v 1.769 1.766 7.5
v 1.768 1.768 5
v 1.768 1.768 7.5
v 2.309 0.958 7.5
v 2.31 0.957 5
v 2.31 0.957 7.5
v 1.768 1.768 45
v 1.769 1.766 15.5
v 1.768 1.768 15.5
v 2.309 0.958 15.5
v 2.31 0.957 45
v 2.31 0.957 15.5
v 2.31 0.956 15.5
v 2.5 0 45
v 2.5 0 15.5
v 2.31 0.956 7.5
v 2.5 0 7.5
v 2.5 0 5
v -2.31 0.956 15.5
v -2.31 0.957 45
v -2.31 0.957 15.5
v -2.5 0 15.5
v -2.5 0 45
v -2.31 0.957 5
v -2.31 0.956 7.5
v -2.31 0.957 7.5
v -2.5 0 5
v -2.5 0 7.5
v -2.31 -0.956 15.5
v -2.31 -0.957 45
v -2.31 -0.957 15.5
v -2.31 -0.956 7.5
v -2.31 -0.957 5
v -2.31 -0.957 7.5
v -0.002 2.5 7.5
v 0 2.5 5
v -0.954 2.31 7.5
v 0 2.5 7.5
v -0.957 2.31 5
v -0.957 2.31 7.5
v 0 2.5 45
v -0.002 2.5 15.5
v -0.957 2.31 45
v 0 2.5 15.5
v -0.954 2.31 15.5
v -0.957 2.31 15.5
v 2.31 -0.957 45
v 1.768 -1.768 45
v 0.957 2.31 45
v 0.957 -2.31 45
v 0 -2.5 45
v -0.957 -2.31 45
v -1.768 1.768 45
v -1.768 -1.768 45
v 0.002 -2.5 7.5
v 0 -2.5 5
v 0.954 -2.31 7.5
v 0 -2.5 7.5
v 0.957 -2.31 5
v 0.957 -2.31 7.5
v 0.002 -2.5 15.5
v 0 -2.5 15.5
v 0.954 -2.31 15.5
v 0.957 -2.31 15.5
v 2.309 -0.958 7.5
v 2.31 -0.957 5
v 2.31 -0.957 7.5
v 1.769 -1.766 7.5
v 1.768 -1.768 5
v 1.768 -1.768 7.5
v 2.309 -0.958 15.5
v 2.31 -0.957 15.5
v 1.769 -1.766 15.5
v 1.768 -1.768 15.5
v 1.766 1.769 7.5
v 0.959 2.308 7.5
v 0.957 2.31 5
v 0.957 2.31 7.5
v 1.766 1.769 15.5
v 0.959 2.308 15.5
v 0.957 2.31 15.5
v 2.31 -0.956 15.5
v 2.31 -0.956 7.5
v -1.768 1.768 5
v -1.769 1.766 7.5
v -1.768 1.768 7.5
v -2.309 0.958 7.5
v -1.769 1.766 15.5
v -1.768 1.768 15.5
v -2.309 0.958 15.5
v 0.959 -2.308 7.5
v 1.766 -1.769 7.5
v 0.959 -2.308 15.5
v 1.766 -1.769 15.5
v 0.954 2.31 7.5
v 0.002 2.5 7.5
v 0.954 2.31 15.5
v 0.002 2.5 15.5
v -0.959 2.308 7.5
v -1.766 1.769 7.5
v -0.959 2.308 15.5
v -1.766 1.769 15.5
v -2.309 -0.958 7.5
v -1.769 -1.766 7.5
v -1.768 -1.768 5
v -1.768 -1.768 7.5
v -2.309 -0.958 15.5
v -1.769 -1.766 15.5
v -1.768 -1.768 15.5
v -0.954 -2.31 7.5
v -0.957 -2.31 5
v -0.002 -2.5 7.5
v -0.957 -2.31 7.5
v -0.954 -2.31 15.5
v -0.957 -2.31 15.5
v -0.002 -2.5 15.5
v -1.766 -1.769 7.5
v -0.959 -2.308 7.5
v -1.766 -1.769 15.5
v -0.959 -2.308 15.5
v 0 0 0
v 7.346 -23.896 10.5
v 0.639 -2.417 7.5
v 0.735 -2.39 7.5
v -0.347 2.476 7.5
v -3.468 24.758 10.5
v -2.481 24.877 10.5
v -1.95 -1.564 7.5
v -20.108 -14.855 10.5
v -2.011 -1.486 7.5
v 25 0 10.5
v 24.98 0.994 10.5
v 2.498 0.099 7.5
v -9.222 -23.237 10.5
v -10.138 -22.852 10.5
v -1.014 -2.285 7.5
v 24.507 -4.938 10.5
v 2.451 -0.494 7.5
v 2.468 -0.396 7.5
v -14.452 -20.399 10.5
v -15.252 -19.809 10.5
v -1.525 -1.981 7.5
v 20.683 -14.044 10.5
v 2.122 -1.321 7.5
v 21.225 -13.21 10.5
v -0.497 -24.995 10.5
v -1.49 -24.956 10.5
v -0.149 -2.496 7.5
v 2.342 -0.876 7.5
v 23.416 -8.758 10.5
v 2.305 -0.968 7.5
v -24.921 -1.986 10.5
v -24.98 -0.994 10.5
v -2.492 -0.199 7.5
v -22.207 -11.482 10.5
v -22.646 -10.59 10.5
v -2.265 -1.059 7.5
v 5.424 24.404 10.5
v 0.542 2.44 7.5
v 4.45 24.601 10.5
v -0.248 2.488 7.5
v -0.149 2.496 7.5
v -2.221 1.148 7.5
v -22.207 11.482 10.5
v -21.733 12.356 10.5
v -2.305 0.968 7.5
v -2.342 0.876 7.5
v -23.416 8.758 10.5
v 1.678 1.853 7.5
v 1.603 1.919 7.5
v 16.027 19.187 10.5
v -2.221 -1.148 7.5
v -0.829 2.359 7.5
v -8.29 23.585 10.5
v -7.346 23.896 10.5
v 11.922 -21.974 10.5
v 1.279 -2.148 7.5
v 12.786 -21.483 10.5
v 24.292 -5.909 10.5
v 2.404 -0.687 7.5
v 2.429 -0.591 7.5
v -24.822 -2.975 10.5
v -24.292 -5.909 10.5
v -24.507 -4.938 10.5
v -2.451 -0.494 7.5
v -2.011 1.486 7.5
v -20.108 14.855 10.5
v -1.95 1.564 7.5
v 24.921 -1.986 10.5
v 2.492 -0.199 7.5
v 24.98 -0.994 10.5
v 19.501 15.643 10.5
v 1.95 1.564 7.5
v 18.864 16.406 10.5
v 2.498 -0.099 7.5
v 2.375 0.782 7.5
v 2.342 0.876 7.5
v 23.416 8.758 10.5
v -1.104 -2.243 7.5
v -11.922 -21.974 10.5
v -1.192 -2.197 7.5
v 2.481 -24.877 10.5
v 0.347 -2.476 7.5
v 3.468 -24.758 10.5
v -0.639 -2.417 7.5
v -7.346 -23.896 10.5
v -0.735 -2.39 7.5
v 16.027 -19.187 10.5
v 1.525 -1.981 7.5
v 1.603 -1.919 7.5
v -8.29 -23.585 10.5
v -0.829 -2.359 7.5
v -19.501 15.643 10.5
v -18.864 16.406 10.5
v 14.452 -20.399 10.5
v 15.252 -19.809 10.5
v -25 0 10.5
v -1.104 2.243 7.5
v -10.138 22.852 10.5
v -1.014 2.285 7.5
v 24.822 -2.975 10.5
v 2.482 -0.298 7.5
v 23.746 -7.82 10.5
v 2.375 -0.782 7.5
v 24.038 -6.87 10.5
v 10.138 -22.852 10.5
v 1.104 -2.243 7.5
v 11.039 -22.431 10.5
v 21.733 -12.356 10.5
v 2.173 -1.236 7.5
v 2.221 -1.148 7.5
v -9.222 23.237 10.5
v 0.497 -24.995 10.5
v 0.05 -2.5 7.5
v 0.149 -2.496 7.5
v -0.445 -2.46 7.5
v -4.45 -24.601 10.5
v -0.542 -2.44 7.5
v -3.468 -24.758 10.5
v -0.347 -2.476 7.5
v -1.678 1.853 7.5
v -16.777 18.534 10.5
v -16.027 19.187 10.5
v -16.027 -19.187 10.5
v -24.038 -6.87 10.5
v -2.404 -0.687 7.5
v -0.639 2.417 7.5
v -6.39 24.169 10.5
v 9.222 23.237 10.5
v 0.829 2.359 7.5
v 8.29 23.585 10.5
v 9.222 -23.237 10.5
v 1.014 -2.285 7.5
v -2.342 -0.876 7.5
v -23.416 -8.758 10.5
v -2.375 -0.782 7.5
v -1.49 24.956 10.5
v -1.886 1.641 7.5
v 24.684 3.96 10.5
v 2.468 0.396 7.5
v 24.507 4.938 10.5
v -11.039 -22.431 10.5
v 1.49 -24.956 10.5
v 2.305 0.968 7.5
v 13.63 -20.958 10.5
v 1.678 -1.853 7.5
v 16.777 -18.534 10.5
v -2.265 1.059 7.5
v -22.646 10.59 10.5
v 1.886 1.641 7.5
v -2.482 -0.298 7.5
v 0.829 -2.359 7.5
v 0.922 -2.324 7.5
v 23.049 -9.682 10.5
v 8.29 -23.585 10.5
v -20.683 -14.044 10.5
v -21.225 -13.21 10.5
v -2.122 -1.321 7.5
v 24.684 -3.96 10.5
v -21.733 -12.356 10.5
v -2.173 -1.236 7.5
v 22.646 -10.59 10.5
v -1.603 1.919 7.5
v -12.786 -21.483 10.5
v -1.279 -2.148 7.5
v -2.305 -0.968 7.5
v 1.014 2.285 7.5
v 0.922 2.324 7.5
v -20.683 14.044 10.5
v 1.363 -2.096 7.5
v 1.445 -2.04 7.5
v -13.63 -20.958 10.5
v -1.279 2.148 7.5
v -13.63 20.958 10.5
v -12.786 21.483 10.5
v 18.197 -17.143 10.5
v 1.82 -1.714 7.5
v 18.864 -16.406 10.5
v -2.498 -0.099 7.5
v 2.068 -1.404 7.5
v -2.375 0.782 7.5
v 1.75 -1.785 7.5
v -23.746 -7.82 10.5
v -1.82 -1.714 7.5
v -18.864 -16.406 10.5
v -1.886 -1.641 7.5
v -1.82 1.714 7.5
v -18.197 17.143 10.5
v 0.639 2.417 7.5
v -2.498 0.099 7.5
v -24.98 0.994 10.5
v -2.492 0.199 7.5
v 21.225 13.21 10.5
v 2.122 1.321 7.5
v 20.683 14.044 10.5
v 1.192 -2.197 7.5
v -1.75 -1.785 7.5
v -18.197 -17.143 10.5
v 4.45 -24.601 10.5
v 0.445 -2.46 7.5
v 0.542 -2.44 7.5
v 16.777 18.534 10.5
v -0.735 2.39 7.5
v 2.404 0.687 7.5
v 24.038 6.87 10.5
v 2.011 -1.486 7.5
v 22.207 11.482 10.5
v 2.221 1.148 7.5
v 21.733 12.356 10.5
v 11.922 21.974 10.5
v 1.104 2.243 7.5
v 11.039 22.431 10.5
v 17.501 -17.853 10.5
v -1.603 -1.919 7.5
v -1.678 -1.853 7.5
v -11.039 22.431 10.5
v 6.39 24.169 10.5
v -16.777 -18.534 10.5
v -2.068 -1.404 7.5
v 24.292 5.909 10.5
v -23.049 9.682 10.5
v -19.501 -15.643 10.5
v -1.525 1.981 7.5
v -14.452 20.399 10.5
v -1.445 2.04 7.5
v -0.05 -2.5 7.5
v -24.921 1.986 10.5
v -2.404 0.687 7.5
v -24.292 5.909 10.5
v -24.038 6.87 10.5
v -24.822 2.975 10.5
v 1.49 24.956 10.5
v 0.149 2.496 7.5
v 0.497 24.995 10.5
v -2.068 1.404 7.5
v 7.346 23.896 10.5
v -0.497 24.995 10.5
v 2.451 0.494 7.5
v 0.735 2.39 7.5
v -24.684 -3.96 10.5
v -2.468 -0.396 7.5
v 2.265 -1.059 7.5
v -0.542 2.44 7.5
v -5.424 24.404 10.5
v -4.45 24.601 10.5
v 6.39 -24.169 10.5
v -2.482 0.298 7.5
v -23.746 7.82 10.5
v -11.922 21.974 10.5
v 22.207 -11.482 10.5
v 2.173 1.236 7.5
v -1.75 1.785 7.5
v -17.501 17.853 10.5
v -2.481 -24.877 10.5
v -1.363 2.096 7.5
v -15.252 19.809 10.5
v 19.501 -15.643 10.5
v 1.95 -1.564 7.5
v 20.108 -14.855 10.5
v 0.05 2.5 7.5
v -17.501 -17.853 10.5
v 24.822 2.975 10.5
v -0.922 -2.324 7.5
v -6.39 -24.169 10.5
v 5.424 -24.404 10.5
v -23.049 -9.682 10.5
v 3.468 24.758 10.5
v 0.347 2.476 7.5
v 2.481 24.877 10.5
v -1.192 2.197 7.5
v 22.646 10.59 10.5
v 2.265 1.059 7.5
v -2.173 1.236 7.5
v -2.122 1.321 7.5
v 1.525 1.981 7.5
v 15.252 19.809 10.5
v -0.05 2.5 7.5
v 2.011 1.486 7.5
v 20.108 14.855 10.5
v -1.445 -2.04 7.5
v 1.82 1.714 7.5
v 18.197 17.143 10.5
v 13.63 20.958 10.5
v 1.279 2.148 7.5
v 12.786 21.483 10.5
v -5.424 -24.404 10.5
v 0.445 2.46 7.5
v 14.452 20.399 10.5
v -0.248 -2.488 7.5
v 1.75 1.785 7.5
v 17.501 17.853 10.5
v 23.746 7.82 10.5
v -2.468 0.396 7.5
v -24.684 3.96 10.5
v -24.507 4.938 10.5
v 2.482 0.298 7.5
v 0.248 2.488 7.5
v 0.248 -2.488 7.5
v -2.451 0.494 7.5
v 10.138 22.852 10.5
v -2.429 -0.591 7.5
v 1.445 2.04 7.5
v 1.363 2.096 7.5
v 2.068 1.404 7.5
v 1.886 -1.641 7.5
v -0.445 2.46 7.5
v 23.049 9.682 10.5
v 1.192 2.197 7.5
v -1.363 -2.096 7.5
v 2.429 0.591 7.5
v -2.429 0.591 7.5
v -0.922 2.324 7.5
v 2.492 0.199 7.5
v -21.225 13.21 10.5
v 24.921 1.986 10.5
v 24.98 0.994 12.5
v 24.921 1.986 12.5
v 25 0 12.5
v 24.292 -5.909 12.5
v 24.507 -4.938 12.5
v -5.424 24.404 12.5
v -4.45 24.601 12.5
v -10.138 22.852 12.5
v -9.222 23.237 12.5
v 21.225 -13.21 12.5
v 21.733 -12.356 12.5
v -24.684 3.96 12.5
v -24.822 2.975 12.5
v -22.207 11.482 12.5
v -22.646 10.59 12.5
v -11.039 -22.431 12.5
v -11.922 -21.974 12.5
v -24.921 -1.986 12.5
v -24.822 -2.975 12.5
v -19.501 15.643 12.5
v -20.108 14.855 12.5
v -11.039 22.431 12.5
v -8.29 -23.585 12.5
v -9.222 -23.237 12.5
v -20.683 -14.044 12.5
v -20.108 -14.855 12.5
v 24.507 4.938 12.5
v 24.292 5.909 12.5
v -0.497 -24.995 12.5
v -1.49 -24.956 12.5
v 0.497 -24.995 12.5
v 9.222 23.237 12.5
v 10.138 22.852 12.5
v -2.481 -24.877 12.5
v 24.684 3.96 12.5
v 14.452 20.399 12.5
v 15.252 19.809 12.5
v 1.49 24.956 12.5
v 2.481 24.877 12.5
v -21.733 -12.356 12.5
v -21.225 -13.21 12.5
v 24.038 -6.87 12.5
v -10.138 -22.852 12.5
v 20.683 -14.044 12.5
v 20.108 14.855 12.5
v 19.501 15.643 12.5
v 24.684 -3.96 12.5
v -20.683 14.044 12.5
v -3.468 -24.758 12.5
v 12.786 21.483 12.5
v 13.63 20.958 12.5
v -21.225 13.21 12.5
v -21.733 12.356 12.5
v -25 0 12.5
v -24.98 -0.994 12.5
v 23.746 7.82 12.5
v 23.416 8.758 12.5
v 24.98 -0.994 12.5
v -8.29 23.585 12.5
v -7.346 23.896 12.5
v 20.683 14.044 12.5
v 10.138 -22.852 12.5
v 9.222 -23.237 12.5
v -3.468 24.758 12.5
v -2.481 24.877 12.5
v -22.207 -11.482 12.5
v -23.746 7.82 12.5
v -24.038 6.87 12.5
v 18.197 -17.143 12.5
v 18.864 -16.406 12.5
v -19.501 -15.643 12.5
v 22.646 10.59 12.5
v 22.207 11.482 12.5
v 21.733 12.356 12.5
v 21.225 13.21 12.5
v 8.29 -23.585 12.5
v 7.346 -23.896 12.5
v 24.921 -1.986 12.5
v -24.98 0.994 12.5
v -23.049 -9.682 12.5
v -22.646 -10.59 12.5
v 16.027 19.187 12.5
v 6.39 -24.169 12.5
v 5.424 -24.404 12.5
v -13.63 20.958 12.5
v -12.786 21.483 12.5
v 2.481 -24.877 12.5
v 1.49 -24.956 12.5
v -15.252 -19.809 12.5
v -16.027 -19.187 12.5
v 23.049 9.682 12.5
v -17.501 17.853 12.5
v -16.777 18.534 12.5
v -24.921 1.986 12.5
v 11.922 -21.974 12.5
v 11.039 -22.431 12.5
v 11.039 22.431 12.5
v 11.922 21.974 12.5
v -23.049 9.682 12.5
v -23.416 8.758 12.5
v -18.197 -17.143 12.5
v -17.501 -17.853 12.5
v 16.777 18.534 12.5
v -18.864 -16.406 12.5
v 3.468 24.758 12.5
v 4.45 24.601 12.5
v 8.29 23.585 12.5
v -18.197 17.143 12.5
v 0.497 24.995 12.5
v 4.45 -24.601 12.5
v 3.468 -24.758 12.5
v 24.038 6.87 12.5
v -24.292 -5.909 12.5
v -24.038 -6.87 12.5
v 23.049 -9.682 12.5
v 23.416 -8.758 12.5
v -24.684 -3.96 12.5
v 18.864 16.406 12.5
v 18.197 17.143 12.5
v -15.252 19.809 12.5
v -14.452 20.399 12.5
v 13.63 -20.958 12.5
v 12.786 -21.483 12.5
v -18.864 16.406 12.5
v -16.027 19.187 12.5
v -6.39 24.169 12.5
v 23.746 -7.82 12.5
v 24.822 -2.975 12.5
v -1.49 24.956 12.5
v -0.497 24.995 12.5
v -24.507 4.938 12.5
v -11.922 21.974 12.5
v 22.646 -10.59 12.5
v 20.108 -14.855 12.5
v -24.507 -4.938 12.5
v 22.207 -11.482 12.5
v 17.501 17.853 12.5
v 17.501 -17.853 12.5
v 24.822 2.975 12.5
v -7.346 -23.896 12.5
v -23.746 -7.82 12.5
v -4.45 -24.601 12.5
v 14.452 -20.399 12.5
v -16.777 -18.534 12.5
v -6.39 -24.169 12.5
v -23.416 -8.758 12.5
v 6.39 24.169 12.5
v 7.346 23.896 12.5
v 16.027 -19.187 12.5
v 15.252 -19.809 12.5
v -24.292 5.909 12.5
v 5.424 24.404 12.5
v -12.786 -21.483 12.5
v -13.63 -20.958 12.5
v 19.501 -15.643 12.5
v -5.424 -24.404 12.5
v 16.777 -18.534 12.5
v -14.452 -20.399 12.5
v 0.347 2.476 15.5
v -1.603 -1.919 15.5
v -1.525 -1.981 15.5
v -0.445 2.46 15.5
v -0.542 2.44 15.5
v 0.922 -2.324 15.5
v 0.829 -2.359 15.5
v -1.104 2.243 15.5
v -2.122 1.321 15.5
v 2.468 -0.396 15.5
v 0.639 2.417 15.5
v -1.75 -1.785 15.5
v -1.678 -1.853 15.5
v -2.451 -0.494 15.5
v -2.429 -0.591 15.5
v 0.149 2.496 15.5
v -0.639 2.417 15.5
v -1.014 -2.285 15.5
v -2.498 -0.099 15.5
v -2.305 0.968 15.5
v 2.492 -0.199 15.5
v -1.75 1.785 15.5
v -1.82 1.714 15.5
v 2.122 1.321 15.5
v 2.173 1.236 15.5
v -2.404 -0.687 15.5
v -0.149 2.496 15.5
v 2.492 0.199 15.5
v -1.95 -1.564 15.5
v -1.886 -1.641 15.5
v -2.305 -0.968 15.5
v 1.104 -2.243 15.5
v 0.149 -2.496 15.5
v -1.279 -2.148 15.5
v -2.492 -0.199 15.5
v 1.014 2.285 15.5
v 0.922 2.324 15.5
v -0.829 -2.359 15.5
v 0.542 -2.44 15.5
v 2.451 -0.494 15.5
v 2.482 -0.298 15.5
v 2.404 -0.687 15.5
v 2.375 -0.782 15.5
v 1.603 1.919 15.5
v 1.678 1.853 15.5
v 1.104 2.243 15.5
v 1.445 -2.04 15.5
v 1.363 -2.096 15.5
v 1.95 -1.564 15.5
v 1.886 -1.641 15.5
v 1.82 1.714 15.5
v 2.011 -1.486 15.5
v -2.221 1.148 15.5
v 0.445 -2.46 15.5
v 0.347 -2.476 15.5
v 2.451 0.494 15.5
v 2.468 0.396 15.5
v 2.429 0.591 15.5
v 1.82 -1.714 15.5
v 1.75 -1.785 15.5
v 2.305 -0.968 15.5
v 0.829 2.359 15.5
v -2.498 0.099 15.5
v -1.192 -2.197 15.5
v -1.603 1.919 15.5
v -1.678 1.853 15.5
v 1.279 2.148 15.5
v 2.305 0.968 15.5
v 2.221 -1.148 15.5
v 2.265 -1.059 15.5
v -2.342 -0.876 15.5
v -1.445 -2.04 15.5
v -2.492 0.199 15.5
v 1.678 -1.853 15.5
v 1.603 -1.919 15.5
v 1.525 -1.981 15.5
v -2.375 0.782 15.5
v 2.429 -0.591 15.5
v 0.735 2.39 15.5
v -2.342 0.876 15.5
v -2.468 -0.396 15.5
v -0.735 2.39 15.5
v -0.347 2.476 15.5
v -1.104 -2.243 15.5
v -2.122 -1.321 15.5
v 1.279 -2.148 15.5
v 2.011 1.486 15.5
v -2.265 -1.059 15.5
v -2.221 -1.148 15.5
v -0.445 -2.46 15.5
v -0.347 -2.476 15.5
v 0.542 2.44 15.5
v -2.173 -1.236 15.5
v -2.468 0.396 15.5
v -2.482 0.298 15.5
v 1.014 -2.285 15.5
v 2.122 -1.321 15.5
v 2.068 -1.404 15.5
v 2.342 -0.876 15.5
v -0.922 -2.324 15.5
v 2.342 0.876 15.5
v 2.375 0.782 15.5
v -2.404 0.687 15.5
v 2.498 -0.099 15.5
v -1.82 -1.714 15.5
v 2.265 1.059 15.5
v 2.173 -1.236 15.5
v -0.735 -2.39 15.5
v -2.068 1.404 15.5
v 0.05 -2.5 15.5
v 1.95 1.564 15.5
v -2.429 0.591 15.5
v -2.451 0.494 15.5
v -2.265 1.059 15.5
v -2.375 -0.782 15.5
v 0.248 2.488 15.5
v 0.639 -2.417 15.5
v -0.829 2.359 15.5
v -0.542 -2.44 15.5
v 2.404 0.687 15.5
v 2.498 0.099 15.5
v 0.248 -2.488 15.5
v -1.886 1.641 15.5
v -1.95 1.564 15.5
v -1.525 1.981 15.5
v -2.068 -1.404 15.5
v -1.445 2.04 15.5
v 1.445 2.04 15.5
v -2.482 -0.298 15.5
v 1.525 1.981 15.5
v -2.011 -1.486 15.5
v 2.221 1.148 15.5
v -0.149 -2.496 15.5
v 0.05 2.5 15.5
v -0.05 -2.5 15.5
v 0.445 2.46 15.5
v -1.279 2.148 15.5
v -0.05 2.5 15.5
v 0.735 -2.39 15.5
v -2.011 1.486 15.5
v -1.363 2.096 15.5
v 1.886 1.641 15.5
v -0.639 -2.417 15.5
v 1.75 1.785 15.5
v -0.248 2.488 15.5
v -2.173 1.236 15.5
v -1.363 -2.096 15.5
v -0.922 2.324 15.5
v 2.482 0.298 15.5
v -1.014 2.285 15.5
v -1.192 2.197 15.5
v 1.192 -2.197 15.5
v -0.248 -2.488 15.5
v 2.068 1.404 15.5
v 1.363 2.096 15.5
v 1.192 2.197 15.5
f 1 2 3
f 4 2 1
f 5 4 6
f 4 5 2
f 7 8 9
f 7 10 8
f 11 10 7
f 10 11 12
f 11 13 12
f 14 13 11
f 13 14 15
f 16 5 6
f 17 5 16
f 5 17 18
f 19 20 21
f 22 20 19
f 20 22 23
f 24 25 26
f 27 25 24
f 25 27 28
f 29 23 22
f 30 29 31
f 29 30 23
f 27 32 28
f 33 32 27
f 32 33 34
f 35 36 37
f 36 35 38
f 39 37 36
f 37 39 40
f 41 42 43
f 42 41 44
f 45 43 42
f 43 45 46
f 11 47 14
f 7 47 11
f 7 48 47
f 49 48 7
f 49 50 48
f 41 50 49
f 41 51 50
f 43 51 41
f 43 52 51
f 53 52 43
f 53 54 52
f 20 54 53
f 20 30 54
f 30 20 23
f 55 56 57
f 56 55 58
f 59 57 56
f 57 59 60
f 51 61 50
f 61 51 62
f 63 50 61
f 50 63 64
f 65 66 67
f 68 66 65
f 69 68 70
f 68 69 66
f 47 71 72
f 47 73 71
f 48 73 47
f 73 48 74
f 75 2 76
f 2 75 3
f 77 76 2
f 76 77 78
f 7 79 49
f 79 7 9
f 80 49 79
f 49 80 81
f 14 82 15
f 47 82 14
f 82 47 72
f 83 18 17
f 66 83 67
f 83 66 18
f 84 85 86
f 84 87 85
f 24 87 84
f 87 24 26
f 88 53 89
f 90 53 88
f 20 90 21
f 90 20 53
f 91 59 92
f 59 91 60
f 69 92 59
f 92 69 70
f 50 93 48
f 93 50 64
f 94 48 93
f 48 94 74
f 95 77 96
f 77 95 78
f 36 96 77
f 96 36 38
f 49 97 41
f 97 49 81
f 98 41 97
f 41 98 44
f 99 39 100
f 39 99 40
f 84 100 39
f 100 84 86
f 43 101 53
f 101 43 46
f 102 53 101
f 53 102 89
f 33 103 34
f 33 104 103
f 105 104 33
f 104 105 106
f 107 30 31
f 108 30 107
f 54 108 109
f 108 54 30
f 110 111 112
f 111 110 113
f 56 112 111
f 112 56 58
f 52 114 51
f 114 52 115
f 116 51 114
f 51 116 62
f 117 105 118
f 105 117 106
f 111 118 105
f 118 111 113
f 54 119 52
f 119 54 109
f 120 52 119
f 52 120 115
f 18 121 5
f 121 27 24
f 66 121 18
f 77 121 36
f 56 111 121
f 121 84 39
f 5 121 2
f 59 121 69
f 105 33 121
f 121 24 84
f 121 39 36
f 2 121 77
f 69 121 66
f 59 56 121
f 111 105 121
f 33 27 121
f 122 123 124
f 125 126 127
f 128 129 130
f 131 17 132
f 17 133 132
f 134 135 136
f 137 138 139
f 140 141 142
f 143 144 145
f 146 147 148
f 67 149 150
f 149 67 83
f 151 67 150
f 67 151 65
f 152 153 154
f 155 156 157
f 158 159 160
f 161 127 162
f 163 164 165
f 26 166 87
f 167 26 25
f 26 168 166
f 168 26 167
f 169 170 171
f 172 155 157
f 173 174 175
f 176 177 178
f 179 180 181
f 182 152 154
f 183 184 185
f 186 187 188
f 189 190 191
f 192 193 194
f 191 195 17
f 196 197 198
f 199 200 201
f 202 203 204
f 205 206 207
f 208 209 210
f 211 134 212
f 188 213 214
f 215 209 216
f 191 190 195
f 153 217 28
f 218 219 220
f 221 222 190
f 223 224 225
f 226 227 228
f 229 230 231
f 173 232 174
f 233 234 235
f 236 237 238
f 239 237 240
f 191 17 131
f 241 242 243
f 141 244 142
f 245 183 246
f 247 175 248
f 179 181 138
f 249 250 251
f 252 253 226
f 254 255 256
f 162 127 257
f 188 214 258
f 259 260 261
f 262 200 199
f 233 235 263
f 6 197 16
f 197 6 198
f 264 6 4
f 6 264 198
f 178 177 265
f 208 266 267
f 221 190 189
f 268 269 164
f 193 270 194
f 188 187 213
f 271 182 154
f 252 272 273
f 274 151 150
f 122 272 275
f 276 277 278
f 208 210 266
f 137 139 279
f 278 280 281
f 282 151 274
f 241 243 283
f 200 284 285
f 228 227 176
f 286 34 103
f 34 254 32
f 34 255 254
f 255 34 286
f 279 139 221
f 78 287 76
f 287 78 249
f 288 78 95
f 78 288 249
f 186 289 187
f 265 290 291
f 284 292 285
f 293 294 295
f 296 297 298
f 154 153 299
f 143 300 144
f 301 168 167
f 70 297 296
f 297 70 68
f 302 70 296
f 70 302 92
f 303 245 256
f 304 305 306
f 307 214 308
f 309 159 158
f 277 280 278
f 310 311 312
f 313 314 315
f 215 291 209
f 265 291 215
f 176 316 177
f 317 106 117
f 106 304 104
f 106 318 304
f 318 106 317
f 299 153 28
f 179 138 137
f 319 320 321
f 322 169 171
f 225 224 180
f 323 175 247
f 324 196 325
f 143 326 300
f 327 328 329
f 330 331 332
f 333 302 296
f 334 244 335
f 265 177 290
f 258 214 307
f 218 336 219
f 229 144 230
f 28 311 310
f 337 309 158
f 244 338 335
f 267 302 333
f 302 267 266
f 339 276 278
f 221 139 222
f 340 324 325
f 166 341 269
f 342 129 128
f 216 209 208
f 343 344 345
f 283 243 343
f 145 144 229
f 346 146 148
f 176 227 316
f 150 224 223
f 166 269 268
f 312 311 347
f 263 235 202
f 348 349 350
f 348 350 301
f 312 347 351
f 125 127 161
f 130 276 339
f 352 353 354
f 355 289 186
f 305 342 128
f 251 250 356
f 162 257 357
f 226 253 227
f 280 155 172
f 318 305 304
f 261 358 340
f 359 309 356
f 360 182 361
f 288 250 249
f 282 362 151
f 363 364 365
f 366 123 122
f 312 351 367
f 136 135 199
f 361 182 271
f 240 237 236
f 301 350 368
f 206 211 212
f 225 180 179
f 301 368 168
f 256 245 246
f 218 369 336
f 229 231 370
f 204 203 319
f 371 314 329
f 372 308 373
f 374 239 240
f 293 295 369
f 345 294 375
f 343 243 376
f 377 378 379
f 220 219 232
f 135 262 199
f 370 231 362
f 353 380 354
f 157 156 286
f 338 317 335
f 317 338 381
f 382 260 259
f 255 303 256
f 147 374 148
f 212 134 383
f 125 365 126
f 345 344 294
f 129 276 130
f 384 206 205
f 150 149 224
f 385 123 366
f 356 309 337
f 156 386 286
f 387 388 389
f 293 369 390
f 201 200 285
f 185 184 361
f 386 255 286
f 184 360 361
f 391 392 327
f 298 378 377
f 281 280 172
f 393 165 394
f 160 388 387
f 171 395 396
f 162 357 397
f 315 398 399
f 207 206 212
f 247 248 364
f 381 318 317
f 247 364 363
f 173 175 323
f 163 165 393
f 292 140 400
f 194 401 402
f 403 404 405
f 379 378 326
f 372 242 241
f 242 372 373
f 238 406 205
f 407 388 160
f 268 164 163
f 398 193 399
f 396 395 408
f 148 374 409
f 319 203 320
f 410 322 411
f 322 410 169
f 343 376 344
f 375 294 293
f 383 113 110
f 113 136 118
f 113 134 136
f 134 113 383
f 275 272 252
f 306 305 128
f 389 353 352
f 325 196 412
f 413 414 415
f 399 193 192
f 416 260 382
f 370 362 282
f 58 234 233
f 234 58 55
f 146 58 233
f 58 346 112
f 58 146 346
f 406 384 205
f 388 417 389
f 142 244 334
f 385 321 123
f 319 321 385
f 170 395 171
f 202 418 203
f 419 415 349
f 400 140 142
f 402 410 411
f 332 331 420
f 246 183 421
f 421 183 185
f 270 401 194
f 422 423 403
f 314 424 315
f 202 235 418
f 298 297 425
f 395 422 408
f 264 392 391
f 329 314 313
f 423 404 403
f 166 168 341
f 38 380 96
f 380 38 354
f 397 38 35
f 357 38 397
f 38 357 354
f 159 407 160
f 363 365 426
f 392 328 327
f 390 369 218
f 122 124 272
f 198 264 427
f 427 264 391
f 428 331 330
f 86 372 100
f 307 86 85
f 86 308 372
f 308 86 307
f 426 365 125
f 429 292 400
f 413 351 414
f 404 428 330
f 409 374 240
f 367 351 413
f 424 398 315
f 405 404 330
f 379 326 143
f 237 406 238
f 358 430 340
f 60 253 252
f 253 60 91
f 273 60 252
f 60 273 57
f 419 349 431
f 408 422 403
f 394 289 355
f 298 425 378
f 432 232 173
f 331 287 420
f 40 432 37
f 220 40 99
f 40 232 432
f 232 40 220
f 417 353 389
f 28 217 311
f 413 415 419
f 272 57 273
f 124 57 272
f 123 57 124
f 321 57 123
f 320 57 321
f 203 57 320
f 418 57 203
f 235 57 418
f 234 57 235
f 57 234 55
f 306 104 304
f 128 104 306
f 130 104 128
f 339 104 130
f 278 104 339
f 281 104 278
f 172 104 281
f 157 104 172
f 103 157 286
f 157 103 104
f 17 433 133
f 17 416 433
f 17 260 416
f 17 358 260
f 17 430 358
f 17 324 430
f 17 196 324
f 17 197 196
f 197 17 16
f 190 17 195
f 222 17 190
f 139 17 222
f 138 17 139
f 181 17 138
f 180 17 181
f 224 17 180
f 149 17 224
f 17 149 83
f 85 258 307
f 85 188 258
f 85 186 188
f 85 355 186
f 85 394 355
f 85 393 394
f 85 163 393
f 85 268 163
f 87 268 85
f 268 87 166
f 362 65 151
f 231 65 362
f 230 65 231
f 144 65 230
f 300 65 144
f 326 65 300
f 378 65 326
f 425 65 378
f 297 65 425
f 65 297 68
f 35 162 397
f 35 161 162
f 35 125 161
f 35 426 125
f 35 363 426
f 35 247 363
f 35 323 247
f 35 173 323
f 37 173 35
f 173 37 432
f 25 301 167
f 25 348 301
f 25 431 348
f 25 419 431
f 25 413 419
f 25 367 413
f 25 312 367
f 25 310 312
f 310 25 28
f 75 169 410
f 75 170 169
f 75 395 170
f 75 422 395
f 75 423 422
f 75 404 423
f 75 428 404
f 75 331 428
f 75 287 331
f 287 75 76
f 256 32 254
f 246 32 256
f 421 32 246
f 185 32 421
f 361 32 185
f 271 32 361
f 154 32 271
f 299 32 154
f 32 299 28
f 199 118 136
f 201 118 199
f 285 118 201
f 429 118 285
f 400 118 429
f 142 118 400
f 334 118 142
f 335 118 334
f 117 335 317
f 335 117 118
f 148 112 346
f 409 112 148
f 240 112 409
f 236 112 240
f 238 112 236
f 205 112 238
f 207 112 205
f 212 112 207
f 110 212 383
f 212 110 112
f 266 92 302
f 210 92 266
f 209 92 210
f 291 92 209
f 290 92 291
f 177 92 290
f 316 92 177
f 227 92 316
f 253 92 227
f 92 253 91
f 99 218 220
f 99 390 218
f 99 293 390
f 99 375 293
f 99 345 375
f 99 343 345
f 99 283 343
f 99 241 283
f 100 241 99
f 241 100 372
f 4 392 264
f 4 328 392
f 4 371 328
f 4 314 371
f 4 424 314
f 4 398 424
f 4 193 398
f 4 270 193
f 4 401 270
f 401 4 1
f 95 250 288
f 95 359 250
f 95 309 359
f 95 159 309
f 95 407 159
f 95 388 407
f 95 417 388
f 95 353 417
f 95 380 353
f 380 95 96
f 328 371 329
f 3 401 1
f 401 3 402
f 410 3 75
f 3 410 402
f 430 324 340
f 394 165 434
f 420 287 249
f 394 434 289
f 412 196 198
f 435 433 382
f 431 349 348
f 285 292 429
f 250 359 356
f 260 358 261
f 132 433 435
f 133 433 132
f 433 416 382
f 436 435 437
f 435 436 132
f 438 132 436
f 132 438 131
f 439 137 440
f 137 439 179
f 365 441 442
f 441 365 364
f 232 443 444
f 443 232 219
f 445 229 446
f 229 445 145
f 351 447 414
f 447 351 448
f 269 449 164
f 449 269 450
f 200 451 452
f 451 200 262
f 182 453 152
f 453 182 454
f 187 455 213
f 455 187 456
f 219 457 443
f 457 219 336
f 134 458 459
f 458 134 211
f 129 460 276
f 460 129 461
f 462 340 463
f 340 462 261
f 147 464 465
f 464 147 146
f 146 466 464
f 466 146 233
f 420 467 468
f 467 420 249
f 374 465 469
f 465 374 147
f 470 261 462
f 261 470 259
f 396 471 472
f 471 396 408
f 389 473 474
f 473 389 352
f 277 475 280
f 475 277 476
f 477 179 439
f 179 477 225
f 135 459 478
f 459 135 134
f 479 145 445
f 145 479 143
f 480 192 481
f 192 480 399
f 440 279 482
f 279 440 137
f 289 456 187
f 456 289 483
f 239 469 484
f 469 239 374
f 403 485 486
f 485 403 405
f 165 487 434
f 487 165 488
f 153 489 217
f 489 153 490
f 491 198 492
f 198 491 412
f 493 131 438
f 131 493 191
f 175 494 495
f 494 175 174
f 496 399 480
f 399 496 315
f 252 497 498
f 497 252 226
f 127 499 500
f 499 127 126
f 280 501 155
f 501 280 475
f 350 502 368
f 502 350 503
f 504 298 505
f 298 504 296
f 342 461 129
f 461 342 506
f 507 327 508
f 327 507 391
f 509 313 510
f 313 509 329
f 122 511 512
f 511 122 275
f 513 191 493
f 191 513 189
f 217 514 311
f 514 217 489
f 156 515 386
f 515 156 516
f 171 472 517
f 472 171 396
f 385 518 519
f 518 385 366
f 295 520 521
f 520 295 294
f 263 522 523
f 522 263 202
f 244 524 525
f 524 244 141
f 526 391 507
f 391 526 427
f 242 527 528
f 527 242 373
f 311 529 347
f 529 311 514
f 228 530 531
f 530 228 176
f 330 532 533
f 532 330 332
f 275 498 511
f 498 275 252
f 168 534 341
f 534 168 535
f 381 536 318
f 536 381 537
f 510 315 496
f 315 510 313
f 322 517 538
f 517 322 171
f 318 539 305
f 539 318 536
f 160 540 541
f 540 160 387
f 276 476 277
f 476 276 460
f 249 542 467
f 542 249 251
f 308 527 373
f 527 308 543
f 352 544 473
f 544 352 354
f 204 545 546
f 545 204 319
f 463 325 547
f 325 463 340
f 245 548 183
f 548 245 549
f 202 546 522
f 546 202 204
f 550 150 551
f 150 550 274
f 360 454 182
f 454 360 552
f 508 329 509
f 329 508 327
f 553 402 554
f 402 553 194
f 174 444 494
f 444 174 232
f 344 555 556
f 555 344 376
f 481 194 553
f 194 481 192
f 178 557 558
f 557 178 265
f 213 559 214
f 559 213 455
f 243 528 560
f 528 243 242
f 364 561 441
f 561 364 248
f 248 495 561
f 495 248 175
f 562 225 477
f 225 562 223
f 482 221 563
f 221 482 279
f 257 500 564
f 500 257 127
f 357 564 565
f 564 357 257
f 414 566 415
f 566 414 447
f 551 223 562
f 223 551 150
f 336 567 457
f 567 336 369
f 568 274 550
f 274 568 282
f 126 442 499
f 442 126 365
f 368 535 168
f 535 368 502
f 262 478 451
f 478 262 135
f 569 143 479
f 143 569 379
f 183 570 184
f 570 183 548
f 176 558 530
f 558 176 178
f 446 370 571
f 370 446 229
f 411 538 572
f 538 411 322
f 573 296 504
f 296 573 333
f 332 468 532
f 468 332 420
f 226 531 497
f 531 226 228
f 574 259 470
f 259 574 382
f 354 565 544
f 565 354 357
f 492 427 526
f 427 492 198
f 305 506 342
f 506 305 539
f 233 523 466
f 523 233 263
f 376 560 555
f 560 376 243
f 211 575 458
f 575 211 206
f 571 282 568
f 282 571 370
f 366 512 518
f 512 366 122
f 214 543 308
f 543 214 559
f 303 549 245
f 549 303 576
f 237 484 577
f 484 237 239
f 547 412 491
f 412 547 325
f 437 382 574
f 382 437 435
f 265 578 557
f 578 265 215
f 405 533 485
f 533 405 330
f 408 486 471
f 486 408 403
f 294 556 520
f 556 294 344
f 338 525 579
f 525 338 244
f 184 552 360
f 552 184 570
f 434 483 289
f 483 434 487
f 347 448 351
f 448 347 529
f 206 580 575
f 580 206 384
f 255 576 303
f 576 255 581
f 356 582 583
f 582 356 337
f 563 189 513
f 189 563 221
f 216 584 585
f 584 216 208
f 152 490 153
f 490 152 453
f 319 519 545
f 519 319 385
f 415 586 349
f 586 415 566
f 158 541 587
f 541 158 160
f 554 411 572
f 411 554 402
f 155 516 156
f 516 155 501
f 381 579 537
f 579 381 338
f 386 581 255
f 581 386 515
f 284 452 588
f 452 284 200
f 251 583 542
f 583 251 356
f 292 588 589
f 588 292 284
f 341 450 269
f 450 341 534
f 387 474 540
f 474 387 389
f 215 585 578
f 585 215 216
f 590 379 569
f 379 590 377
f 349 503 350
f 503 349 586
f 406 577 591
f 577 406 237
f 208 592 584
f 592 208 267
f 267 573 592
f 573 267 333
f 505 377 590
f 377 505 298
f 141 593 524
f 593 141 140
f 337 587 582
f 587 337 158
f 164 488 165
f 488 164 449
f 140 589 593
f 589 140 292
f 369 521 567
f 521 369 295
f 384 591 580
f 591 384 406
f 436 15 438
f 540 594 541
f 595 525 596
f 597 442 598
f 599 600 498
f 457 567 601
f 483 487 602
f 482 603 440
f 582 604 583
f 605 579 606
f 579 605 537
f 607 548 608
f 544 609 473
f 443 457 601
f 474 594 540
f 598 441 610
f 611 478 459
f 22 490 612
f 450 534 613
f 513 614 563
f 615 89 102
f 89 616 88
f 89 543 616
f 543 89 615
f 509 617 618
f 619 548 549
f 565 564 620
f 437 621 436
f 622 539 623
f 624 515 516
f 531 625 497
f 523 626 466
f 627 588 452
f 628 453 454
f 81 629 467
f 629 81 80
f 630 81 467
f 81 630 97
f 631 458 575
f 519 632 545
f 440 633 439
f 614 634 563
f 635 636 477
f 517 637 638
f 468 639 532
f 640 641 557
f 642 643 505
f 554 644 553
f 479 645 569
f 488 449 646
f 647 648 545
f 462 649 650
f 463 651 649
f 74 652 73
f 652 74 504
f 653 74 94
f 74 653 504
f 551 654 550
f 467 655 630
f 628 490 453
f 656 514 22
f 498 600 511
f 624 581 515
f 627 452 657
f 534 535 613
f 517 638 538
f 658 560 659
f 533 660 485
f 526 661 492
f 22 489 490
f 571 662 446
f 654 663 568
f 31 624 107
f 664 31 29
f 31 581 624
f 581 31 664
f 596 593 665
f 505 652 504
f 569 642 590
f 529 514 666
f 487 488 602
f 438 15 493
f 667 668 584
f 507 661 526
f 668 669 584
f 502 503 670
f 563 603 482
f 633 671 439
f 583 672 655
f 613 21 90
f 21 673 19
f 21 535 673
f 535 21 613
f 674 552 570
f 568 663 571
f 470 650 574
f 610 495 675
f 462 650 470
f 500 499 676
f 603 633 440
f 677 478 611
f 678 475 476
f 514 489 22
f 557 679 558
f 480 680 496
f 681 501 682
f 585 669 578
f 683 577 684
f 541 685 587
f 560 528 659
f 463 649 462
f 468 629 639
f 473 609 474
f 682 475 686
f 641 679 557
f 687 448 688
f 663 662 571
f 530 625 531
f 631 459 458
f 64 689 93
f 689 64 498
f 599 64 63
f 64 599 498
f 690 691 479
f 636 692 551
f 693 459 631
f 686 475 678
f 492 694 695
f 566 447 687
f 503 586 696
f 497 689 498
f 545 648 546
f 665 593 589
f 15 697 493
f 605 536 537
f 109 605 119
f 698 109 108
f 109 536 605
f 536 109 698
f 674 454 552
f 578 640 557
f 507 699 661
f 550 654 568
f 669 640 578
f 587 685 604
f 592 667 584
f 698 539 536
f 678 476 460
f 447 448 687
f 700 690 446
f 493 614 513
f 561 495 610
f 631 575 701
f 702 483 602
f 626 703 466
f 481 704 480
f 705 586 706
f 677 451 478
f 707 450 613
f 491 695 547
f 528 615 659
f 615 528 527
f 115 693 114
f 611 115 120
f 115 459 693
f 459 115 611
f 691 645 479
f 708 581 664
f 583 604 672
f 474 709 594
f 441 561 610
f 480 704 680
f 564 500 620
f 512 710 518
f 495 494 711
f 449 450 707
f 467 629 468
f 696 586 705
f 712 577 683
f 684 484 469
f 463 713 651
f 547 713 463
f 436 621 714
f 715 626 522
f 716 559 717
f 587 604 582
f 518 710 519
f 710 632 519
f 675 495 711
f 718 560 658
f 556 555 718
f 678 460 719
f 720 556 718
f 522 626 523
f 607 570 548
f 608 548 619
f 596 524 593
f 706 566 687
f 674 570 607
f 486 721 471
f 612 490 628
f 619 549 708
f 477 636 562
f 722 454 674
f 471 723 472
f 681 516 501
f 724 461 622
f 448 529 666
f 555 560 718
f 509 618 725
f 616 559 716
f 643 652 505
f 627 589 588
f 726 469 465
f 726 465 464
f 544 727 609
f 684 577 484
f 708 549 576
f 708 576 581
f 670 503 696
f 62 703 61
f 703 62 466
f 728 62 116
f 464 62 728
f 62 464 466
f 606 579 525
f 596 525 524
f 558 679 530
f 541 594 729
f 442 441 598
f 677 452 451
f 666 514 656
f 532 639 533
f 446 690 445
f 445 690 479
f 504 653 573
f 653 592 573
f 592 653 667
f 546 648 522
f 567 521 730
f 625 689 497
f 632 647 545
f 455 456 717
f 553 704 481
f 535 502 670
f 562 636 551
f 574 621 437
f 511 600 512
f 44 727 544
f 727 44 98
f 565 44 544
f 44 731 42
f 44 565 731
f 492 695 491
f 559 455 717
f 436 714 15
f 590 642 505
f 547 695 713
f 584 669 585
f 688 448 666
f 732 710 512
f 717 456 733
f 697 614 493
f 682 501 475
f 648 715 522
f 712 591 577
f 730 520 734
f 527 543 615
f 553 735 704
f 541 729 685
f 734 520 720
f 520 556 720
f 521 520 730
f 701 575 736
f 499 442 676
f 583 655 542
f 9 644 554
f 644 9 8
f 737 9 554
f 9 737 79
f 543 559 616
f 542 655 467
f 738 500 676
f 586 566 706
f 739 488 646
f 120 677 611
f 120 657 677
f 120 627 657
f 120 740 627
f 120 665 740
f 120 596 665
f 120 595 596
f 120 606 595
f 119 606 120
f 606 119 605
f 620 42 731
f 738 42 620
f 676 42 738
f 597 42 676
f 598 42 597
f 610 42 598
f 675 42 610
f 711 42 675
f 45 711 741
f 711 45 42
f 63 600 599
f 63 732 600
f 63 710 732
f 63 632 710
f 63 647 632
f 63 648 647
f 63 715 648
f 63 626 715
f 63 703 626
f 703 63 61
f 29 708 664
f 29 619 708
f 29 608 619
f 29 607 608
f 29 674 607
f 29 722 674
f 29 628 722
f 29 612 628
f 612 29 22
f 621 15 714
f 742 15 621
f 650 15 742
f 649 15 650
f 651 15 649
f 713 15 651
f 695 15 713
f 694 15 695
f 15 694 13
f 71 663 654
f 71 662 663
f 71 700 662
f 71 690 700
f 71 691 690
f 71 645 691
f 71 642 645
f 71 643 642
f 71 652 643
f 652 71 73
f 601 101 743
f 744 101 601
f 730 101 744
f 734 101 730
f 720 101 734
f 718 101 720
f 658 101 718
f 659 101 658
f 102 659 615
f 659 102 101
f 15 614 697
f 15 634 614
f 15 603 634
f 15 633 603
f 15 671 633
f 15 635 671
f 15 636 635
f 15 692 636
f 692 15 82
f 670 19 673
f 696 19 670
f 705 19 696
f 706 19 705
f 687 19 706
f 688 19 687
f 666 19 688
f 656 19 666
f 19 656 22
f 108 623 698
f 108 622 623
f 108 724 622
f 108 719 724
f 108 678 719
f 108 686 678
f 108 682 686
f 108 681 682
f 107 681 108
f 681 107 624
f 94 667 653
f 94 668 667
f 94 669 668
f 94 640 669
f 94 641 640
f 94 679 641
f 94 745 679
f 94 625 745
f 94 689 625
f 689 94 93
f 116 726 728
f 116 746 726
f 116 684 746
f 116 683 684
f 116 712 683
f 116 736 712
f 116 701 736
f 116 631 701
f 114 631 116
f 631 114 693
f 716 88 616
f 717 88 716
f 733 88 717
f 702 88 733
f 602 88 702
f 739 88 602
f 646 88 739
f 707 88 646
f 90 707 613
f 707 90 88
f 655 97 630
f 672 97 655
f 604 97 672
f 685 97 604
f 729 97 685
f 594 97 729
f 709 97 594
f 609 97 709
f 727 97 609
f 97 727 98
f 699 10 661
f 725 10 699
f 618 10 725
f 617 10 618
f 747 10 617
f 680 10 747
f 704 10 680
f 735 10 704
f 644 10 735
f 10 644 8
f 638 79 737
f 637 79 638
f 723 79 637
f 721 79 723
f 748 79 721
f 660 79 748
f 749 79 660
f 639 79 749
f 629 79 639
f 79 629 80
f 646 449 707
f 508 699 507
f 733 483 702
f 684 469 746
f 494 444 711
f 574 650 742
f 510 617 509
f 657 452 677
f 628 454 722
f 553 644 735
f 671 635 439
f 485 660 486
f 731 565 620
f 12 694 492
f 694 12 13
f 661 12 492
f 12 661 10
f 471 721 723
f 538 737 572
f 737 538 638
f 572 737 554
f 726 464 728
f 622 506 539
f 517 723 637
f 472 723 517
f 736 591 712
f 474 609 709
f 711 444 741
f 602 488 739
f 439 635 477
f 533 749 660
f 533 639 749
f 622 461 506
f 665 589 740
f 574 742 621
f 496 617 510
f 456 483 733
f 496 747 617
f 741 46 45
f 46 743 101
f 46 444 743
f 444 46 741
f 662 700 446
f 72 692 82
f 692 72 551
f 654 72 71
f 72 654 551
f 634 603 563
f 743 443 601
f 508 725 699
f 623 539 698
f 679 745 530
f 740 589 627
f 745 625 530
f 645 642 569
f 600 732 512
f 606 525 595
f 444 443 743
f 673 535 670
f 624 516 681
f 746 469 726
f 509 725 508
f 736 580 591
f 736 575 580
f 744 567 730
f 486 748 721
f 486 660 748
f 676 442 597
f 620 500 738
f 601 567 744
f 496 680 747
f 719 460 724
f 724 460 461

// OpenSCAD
$fa = 1;
$fs = 1;

h = 7.5;

# translate([0, 0, 5]) cylinder(40, 2.5, 2.5);

# cylinder(5, 0, 2.5);

translate([0, 0, h]) cylinder(3, 2.5, 25);
translate([0, 0, h+3]) cylinder(2, 25, 25);
translate([0, 0, h+5]) cylinder(3, 25, 2.5);
